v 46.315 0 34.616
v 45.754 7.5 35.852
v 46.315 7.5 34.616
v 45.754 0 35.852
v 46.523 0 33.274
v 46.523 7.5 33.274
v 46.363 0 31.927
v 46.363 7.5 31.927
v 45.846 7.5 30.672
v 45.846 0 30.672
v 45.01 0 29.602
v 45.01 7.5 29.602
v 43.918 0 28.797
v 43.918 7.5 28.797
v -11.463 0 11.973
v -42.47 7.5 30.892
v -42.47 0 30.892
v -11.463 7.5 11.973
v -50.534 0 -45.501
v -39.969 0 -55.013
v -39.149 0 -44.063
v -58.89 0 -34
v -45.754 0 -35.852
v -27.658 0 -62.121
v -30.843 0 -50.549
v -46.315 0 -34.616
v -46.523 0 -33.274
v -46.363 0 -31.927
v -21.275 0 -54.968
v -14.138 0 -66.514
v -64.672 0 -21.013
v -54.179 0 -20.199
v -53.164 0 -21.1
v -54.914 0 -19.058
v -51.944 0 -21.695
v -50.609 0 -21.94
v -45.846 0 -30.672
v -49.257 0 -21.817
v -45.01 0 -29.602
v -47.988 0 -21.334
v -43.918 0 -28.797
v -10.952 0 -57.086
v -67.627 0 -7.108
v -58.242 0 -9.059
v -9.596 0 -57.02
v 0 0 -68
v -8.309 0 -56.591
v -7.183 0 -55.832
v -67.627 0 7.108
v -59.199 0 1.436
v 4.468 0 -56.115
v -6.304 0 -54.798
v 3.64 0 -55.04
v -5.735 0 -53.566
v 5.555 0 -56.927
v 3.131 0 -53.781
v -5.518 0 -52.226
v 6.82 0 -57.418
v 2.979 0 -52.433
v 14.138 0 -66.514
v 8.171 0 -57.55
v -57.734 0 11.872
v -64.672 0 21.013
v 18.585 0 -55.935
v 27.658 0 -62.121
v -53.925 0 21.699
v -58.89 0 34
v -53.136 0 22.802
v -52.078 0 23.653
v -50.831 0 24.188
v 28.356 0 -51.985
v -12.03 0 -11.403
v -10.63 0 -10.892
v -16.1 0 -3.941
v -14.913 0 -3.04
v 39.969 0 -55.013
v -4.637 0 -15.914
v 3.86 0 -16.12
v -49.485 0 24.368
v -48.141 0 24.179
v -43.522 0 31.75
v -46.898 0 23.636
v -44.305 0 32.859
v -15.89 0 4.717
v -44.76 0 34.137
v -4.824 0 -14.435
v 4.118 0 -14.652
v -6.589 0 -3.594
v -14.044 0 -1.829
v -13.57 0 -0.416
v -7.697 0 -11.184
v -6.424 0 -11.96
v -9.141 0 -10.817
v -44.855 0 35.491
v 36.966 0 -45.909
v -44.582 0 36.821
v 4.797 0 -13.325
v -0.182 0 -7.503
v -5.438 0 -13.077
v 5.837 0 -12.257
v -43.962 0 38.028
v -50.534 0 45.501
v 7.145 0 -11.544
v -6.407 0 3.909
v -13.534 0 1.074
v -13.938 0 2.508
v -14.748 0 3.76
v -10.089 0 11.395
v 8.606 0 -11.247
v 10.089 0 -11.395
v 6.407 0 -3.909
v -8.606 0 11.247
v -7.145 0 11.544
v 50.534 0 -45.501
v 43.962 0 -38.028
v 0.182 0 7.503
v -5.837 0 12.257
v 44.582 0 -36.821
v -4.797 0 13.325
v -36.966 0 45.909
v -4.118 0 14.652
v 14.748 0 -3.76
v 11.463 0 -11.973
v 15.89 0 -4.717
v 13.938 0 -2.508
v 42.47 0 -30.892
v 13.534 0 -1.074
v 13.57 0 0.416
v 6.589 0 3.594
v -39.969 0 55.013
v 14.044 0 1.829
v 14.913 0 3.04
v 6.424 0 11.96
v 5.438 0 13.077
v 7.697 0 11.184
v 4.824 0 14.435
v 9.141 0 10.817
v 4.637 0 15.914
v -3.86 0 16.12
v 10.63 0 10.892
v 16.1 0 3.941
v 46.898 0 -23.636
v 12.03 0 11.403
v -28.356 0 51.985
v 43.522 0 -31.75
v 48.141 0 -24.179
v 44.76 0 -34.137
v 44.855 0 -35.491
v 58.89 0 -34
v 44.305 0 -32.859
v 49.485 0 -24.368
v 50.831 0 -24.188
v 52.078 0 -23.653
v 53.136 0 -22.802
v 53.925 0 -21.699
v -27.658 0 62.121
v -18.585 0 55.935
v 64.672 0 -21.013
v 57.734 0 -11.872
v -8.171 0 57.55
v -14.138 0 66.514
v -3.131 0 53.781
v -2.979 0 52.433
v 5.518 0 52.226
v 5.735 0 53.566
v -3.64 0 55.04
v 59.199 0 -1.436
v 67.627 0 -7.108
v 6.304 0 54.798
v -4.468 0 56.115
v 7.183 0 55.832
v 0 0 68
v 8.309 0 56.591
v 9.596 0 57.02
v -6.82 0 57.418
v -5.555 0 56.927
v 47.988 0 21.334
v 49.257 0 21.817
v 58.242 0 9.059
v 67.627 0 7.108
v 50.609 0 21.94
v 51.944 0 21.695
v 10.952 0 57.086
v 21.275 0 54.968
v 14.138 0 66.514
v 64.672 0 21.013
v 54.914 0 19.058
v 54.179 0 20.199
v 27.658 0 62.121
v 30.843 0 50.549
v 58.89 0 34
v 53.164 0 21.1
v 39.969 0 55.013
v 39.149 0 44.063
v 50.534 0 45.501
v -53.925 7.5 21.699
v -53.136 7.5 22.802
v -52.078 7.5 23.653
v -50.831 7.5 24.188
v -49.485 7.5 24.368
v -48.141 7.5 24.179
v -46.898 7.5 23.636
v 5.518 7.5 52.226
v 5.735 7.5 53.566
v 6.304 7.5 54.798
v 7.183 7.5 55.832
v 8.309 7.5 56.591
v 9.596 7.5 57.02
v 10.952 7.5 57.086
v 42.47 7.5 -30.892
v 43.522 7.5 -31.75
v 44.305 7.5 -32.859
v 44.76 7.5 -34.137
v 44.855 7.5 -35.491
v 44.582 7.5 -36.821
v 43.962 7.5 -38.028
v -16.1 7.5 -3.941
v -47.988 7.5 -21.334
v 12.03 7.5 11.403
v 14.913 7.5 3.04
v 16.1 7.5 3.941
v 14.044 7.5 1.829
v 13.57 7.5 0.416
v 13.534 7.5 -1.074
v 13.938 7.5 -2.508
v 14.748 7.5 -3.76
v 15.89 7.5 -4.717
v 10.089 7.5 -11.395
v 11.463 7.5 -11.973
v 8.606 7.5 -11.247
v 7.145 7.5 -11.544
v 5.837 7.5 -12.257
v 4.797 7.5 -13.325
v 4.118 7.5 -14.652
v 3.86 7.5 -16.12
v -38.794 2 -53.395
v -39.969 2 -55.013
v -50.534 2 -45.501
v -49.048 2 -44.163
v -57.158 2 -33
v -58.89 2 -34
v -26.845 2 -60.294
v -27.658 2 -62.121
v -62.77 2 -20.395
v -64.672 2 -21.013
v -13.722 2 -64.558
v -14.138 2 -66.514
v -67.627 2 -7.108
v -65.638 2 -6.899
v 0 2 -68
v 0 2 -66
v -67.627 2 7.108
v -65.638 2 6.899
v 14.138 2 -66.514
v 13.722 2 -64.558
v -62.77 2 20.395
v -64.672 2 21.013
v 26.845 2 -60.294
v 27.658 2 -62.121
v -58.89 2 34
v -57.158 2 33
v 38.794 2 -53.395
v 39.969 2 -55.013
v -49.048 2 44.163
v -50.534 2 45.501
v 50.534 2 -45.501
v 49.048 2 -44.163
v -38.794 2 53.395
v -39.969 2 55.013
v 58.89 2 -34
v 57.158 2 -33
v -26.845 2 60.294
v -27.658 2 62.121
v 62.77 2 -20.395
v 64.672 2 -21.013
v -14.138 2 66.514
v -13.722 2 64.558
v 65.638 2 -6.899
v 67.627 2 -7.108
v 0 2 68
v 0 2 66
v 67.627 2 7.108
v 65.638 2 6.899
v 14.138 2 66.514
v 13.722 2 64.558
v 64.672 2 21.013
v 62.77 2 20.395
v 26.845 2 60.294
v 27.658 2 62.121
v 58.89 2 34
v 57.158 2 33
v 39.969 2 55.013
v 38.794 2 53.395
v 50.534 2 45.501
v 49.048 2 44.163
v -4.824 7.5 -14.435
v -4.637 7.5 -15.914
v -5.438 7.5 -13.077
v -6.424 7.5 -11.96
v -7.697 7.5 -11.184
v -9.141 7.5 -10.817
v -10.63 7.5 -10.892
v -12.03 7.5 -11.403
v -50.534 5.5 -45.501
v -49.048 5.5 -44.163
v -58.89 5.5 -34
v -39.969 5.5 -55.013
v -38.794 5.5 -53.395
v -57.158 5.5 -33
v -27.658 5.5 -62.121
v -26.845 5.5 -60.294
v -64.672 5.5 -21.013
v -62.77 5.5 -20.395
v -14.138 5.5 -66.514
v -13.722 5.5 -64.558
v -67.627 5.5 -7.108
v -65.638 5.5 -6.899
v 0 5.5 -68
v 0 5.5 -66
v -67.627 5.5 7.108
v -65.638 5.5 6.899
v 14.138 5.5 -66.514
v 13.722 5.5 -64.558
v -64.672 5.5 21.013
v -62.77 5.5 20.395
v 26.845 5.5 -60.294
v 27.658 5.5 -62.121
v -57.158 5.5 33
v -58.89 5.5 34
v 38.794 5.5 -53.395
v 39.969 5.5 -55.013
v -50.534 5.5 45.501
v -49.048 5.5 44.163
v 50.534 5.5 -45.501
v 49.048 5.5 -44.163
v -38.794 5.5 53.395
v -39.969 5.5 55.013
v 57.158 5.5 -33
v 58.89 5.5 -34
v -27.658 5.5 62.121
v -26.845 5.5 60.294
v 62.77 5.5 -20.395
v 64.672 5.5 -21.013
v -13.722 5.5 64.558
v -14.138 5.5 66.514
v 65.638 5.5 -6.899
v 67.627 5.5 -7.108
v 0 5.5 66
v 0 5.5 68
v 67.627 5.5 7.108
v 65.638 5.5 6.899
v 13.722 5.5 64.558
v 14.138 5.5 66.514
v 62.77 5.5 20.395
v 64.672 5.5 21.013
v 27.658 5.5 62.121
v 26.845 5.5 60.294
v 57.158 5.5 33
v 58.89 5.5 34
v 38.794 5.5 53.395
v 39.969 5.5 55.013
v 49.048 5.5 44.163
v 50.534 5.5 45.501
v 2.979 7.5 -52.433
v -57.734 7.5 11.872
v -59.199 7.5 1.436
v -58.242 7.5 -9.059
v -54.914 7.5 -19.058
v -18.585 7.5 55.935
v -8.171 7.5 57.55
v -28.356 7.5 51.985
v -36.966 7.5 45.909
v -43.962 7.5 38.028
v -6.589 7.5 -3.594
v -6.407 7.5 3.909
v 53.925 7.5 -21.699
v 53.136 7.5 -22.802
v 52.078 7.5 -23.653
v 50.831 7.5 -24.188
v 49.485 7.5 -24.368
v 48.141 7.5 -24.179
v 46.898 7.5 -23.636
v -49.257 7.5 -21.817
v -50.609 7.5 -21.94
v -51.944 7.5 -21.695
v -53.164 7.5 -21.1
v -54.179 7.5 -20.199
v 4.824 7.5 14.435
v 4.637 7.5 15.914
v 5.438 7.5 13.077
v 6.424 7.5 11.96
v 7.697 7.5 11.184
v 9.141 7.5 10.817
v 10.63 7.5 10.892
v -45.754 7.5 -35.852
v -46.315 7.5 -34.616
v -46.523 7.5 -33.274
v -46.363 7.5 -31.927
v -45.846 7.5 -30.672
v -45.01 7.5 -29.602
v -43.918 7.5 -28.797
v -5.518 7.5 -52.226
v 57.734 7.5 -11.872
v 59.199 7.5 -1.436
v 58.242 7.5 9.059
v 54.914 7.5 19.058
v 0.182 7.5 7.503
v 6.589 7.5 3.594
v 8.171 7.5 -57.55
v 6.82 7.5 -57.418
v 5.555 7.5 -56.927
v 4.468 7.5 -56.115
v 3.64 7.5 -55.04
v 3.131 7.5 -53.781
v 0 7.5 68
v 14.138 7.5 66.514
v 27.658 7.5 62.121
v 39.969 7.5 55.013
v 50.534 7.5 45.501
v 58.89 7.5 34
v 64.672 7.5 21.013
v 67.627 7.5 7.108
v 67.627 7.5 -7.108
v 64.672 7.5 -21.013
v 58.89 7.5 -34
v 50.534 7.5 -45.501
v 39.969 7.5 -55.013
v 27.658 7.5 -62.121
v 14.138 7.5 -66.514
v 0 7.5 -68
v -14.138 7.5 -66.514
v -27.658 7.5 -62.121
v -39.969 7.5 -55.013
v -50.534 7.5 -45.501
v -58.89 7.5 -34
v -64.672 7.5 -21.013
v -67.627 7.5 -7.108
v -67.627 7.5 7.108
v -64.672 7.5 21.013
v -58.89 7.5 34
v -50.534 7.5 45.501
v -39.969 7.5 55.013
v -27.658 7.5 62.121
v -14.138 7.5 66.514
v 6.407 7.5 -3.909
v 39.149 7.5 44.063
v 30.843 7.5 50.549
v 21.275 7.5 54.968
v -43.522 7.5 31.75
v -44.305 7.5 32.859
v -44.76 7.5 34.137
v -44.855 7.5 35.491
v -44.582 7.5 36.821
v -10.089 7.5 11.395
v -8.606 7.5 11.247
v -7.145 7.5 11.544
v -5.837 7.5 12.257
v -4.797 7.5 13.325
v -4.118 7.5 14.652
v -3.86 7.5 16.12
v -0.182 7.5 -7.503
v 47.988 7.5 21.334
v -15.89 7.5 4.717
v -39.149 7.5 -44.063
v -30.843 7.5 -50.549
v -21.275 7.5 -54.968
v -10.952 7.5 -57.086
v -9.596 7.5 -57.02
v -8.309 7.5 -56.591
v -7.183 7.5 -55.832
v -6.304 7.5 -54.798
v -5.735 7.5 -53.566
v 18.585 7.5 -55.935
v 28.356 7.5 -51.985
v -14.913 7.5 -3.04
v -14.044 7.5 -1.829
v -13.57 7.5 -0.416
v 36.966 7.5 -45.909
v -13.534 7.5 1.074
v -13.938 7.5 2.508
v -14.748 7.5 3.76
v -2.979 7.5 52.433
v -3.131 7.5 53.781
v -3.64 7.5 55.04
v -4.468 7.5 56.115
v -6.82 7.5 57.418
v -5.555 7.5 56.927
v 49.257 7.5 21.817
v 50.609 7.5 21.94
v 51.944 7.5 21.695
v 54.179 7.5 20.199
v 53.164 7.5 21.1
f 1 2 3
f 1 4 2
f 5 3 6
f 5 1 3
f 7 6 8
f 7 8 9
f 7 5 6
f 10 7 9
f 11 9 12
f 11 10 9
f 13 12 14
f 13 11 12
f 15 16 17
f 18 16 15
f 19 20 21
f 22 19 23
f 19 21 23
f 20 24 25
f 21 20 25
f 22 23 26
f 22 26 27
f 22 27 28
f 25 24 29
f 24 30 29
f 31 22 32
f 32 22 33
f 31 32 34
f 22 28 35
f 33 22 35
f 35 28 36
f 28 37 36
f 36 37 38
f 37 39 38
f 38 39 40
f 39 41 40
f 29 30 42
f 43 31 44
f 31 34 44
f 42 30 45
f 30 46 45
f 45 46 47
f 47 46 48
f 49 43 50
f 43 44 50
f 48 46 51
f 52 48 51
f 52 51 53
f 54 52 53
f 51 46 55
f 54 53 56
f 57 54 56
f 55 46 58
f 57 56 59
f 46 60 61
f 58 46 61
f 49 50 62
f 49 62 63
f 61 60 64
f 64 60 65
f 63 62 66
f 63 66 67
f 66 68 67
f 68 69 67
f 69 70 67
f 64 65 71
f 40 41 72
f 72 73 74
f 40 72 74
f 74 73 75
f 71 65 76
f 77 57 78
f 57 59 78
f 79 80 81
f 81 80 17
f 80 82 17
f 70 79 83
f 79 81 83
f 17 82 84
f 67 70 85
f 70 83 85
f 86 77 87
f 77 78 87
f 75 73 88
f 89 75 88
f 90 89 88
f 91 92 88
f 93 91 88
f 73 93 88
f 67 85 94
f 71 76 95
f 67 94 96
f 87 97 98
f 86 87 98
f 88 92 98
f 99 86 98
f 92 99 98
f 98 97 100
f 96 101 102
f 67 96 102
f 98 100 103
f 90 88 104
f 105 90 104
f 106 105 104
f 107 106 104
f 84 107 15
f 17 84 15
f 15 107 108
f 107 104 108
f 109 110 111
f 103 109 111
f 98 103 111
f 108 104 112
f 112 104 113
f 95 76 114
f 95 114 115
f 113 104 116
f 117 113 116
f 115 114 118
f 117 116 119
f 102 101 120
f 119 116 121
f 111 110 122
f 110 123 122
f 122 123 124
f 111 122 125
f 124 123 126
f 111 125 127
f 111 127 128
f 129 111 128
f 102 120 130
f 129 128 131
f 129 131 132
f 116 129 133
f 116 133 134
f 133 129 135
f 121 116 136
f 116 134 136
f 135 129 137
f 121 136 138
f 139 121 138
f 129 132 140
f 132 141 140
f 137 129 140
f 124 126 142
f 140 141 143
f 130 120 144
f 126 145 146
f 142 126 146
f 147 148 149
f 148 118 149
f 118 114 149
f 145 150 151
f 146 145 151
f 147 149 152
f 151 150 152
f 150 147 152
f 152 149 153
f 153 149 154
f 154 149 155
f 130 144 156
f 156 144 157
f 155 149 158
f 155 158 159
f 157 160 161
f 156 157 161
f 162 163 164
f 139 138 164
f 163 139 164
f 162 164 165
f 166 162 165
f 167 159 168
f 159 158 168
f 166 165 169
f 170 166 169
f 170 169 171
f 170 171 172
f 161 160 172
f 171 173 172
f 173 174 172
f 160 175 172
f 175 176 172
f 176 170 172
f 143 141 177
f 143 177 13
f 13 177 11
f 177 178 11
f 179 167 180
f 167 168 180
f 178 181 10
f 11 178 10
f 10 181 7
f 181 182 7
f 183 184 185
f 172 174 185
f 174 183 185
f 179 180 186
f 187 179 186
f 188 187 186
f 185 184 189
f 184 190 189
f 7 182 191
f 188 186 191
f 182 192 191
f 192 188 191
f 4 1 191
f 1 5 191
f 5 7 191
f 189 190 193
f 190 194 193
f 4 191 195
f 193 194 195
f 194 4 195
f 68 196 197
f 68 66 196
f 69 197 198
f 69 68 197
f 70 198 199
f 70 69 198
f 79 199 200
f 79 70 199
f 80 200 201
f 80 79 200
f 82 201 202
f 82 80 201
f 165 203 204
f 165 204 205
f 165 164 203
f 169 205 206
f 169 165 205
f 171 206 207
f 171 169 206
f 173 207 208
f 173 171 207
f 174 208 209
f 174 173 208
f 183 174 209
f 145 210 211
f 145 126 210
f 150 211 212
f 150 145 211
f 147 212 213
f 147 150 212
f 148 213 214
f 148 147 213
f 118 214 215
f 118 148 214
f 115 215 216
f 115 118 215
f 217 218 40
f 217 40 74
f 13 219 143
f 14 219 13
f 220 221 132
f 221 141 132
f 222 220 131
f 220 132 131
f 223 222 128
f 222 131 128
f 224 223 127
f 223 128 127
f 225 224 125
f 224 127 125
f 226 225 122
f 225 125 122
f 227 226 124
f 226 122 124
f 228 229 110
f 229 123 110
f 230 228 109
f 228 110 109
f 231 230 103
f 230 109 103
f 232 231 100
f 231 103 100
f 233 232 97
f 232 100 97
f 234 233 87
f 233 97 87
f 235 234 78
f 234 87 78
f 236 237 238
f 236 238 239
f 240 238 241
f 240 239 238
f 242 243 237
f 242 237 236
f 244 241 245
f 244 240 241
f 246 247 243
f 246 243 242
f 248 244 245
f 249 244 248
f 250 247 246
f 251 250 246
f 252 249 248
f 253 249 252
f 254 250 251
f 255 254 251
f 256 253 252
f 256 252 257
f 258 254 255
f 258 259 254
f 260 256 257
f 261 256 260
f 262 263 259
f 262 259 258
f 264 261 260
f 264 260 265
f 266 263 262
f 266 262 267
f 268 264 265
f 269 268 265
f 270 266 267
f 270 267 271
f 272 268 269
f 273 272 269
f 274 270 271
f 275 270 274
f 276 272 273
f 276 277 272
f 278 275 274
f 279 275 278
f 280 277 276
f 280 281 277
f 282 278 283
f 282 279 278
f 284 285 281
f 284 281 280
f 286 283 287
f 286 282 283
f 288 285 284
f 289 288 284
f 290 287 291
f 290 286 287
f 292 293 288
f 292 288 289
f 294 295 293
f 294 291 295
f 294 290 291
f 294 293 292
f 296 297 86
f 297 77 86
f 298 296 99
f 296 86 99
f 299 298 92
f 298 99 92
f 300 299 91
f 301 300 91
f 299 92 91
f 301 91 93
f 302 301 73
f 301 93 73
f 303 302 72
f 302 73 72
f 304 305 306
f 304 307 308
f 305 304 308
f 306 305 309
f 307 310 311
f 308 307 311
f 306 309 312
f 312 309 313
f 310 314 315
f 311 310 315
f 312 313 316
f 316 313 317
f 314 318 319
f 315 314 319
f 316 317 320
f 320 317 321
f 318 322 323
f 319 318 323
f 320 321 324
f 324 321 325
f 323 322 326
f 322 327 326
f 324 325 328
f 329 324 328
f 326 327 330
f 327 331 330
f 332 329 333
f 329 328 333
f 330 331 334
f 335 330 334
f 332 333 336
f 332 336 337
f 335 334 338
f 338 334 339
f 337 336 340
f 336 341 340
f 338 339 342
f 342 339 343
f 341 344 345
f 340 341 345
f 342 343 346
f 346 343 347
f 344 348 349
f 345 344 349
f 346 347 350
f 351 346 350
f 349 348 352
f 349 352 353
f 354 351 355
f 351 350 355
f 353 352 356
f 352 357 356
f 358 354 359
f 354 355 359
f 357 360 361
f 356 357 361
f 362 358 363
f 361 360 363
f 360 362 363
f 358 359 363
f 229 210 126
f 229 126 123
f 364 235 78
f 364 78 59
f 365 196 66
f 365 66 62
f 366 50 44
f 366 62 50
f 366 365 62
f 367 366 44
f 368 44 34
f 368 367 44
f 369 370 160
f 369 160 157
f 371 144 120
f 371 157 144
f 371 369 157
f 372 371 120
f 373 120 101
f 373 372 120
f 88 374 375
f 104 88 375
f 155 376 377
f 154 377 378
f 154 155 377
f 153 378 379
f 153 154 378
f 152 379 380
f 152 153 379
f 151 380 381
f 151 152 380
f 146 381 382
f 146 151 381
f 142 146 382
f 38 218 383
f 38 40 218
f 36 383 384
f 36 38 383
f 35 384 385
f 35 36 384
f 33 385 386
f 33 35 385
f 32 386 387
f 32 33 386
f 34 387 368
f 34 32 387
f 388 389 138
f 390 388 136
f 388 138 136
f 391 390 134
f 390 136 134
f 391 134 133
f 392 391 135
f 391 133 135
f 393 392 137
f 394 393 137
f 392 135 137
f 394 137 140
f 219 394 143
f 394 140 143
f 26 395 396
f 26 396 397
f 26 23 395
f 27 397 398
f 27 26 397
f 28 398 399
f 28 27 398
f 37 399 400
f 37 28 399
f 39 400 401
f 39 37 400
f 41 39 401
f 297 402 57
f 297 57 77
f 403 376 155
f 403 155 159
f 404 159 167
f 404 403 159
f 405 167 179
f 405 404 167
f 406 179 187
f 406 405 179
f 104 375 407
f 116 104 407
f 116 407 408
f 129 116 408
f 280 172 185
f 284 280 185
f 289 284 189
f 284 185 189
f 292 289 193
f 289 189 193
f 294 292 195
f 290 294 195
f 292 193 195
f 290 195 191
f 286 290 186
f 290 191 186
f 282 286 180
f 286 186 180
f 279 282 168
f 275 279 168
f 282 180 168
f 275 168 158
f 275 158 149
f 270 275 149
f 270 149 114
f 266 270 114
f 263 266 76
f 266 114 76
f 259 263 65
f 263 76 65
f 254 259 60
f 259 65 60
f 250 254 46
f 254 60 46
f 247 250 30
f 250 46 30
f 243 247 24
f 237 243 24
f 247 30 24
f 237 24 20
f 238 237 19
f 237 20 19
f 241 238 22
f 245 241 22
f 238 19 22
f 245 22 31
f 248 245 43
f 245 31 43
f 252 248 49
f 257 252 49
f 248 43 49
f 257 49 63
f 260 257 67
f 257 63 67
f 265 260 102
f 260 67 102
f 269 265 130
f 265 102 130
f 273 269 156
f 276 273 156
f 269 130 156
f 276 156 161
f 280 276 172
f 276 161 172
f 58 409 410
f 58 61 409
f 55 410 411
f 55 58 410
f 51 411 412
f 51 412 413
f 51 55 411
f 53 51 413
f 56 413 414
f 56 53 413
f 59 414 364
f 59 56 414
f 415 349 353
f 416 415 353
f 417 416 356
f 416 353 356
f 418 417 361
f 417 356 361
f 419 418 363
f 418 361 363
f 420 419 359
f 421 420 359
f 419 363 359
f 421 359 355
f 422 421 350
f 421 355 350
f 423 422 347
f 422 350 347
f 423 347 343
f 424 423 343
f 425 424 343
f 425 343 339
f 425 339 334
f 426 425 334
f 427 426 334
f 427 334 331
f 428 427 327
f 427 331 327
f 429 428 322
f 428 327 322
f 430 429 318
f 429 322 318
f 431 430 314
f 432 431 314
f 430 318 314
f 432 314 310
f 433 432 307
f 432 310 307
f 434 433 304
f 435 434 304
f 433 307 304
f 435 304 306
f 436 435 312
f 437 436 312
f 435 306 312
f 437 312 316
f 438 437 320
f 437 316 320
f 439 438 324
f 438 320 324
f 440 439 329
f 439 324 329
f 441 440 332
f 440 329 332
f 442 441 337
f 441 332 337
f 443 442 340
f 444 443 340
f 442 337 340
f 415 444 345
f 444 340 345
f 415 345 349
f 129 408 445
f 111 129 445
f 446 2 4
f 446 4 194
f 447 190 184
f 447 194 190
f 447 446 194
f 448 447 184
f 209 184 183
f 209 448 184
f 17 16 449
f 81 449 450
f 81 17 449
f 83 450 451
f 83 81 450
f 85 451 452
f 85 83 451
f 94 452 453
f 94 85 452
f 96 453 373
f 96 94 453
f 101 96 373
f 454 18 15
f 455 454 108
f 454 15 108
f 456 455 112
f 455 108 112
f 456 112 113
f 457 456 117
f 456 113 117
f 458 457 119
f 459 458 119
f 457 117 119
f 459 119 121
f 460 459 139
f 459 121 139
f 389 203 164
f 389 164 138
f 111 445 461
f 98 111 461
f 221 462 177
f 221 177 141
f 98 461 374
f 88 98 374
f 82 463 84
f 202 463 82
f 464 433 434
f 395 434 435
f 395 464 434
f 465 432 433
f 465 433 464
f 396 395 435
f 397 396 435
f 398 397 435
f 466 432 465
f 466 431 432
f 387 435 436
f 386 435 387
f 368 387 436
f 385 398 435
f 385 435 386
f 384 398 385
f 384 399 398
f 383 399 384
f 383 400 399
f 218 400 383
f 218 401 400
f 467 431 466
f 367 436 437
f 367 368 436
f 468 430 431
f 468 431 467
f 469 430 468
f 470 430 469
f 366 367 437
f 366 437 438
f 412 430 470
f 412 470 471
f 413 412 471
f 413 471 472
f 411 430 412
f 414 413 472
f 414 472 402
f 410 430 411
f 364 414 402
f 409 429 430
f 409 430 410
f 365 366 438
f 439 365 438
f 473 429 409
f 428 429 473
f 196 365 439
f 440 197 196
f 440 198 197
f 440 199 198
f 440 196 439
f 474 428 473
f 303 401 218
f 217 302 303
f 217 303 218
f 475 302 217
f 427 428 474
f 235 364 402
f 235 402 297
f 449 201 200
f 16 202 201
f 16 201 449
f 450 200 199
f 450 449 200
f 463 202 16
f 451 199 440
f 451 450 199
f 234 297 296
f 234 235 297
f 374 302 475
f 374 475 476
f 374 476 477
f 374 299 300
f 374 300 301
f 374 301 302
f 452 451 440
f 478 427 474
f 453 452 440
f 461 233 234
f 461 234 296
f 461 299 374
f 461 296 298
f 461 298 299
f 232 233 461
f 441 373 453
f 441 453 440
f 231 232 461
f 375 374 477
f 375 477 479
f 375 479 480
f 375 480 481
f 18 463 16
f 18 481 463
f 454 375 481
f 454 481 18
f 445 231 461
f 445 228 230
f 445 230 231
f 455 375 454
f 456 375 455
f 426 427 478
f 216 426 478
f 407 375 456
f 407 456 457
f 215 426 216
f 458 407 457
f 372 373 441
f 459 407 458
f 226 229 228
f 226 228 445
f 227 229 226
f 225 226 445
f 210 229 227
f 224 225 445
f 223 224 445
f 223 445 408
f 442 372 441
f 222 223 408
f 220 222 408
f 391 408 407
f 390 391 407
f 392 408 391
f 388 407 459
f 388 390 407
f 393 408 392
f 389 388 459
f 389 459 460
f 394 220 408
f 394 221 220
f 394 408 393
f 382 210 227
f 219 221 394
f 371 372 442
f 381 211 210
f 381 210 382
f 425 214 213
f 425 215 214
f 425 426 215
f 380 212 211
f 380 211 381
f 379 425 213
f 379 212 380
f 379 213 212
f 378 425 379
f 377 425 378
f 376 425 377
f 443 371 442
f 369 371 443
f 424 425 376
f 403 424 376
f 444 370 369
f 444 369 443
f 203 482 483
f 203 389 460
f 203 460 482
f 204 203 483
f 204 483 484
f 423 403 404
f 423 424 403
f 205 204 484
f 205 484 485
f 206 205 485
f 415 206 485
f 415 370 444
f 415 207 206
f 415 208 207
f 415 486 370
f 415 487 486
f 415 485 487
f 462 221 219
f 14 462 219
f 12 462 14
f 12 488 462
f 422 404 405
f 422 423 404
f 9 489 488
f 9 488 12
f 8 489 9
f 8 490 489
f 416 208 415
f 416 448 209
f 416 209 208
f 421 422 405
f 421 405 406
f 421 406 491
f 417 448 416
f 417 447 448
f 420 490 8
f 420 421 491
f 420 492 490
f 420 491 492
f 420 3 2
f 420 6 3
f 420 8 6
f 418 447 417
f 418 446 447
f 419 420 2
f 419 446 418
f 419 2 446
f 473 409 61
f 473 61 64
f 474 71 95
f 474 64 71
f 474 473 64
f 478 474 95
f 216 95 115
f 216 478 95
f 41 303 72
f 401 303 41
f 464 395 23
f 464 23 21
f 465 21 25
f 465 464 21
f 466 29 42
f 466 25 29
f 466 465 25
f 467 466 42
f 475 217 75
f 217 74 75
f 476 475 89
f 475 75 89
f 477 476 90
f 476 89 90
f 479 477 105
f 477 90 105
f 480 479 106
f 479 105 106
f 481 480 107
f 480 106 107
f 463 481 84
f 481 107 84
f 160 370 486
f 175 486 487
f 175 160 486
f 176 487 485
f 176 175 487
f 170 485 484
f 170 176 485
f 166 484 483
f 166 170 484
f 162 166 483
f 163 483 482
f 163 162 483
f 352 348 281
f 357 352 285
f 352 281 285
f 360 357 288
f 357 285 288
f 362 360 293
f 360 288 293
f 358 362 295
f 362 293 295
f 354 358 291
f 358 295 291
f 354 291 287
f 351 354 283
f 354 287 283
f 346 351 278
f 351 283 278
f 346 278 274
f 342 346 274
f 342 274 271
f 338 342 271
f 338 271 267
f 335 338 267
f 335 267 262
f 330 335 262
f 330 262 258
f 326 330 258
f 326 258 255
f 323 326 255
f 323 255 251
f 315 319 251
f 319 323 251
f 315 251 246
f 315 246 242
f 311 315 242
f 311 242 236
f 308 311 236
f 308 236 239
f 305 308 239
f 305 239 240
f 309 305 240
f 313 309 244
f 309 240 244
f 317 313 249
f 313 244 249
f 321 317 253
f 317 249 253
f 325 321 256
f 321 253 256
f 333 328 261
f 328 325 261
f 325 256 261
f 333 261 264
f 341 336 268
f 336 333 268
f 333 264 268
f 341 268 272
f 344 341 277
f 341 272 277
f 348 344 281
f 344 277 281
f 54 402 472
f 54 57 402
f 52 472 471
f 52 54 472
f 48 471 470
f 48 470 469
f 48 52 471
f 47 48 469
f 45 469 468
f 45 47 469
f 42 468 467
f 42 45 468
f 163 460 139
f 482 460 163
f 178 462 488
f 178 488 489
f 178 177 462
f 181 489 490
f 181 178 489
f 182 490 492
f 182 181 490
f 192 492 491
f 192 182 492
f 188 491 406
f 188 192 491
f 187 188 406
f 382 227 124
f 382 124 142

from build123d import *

# Parameters (mm, degrees)
SKETCH1_R                = 66
BOSS_EXTRUDE1_DEPTH      = 7.5
SKETCH1_4_R              = 68
SKETCH1_4_R_2            = 66
BOSS_EXTRUDE3_DEPTH      = 2
BOSS_EXTRUDE4_START      = -2
SKETCH4_R                = 68
BOSS_EXTRUDE4_DEPTH      = 2
CUT_EXTRUDE1_DEPTH       = 97.458540317
CUT_EXTRUDE2_DEPTH       = 97.458540317
FILLET1_R                = 5
CIRPATTERN1_COUNT        = 6
FILLET1_OF_CIRPATTERN1_R = 5


with BuildPart() as part:
    # Sketch1 → Boss-Extrude1 (new body)
    with BuildSketch(Plane(origin=(0, 0, 0), x_dir=(1, 0, 0), z_dir=(0, 1, 0))):
        Circle(SKETCH1_R)
    extrude(amount=BOSS_EXTRUDE1_DEPTH)

    # Sketch1<4> → Boss-Extrude3 (add)
    with BuildSketch(Plane(origin=(0, 0, 0), x_dir=(1, 0, 0), z_dir=(0, 1, 0))):
        Circle(SKETCH1_4_R)
        Circle(SKETCH1_4_R_2, mode=Mode.SUBTRACT)
    extrude(amount=BOSS_EXTRUDE3_DEPTH)

    # Sketch4 → Boss-Extrude4 (add)
    with BuildSketch(Plane(origin=(0, 7.5, 0), x_dir=(1, 0, 0), z_dir=(0, 1, 0)).offset(BOSS_EXTRUDE4_START)):
        Circle(SKETCH4_R)
    extrude(amount=BOSS_EXTRUDE4_DEPTH)

    # Sketch6 → Cut-Extrude1 (cut, through all)
    with BuildSketch(Plane(origin=(0, 7.5, 0), x_dir=(1, 0, 0), z_dir=(0, 1, 0))):
        Polygon((-6.589092189, 3.594050285), (-6.407084944, -3.909296081), (0.182007245, -7.503346367), (6.589092189, -3.594050285), (6.407084944, 3.909296081), (-0.182007245, 7.503346367), align=None)
    extrude(amount=-CUT_EXTRUDE1_DEPTH, mode=Mode.SUBTRACT)

    # Sketch7 → Cut-Extrude2 (cut, through all)
    with BuildSketch(Plane(origin=(0, 7.5, 0), x_dir=(1, 0, 0), z_dir=(0, 1, 0))):
        with BuildLine():
            Line((-4.427257323, 7.255990118), (-48.322035968, 31.198596652))
            ThreePointArc((-48.322035968, 31.198596652), (-30.84284899, 50.549446572), (-5.639741154, 57.241286786))
            Line((-5.639741154, 57.241286786), (-4.427257323, 7.255990118))
        make_face()
    cut_extrude2 = extrude(amount=-CUT_EXTRUDE2_DEPTH, mode=Mode.SUBTRACT)

    # Fillet1
    fillet1_edges = [part.edges().sort_by_distance(p)[0] for p in [
        (-4.427257323, 3.75, -7.255990118),
        (-5.639741154, 3.75, -57.241286786),
        (-48.322035968, 3.75, -31.198596652),
    ]]
    fillet(fillet1_edges, radius=FILLET1_R)

    # CirPattern1: Cut-Extrude2 ×6 about axis
    cirpattern1_axis = Axis((0, 0, 0), (0, 1, 0))
    for i in range(1, CIRPATTERN1_COUNT):
        add(cut_extrude2.rotate(cirpattern1_axis, i * 360 / CIRPATTERN1_COUNT), mode=Mode.SUBTRACT)

    # Fillet1 of CirPattern1
    fillet1_of_cirpattern1_edges = [part.edges().sort_by_distance(p)[0] for p in [
        (-8.497500434, 3.75, 0.206122251),
        (-52.392279079, 3.75, -23.736484283),
        (-51.179795248, 3.75, 26.248812385),
        (-4.070243111, 3.75, 7.46211237),
        (-46.752537925, 3.75, 33.504802503),
        (-2.857759279, 3.75, 57.447409037),
        (4.427257323, 3.75, 7.255990118),
        (5.639741154, 3.75, 57.241286786),
        (48.322035968, 3.75, 31.198596652),
        (8.497500434, 3.75, -0.206122251),
        (52.392279079, 3.75, 23.736484283),
        (51.179795248, 3.75, -26.248812385),
        (4.070243111, 3.75, -7.46211237),
        (46.752537925, 3.75, -33.504802503),
        (2.857759279, 3.75, -57.447409037),
    ]]
    fillet(fillet1_of_cirpattern1_edges, radius=FILLET1_OF_CIRPATTERN1_R)


solid = part.part
